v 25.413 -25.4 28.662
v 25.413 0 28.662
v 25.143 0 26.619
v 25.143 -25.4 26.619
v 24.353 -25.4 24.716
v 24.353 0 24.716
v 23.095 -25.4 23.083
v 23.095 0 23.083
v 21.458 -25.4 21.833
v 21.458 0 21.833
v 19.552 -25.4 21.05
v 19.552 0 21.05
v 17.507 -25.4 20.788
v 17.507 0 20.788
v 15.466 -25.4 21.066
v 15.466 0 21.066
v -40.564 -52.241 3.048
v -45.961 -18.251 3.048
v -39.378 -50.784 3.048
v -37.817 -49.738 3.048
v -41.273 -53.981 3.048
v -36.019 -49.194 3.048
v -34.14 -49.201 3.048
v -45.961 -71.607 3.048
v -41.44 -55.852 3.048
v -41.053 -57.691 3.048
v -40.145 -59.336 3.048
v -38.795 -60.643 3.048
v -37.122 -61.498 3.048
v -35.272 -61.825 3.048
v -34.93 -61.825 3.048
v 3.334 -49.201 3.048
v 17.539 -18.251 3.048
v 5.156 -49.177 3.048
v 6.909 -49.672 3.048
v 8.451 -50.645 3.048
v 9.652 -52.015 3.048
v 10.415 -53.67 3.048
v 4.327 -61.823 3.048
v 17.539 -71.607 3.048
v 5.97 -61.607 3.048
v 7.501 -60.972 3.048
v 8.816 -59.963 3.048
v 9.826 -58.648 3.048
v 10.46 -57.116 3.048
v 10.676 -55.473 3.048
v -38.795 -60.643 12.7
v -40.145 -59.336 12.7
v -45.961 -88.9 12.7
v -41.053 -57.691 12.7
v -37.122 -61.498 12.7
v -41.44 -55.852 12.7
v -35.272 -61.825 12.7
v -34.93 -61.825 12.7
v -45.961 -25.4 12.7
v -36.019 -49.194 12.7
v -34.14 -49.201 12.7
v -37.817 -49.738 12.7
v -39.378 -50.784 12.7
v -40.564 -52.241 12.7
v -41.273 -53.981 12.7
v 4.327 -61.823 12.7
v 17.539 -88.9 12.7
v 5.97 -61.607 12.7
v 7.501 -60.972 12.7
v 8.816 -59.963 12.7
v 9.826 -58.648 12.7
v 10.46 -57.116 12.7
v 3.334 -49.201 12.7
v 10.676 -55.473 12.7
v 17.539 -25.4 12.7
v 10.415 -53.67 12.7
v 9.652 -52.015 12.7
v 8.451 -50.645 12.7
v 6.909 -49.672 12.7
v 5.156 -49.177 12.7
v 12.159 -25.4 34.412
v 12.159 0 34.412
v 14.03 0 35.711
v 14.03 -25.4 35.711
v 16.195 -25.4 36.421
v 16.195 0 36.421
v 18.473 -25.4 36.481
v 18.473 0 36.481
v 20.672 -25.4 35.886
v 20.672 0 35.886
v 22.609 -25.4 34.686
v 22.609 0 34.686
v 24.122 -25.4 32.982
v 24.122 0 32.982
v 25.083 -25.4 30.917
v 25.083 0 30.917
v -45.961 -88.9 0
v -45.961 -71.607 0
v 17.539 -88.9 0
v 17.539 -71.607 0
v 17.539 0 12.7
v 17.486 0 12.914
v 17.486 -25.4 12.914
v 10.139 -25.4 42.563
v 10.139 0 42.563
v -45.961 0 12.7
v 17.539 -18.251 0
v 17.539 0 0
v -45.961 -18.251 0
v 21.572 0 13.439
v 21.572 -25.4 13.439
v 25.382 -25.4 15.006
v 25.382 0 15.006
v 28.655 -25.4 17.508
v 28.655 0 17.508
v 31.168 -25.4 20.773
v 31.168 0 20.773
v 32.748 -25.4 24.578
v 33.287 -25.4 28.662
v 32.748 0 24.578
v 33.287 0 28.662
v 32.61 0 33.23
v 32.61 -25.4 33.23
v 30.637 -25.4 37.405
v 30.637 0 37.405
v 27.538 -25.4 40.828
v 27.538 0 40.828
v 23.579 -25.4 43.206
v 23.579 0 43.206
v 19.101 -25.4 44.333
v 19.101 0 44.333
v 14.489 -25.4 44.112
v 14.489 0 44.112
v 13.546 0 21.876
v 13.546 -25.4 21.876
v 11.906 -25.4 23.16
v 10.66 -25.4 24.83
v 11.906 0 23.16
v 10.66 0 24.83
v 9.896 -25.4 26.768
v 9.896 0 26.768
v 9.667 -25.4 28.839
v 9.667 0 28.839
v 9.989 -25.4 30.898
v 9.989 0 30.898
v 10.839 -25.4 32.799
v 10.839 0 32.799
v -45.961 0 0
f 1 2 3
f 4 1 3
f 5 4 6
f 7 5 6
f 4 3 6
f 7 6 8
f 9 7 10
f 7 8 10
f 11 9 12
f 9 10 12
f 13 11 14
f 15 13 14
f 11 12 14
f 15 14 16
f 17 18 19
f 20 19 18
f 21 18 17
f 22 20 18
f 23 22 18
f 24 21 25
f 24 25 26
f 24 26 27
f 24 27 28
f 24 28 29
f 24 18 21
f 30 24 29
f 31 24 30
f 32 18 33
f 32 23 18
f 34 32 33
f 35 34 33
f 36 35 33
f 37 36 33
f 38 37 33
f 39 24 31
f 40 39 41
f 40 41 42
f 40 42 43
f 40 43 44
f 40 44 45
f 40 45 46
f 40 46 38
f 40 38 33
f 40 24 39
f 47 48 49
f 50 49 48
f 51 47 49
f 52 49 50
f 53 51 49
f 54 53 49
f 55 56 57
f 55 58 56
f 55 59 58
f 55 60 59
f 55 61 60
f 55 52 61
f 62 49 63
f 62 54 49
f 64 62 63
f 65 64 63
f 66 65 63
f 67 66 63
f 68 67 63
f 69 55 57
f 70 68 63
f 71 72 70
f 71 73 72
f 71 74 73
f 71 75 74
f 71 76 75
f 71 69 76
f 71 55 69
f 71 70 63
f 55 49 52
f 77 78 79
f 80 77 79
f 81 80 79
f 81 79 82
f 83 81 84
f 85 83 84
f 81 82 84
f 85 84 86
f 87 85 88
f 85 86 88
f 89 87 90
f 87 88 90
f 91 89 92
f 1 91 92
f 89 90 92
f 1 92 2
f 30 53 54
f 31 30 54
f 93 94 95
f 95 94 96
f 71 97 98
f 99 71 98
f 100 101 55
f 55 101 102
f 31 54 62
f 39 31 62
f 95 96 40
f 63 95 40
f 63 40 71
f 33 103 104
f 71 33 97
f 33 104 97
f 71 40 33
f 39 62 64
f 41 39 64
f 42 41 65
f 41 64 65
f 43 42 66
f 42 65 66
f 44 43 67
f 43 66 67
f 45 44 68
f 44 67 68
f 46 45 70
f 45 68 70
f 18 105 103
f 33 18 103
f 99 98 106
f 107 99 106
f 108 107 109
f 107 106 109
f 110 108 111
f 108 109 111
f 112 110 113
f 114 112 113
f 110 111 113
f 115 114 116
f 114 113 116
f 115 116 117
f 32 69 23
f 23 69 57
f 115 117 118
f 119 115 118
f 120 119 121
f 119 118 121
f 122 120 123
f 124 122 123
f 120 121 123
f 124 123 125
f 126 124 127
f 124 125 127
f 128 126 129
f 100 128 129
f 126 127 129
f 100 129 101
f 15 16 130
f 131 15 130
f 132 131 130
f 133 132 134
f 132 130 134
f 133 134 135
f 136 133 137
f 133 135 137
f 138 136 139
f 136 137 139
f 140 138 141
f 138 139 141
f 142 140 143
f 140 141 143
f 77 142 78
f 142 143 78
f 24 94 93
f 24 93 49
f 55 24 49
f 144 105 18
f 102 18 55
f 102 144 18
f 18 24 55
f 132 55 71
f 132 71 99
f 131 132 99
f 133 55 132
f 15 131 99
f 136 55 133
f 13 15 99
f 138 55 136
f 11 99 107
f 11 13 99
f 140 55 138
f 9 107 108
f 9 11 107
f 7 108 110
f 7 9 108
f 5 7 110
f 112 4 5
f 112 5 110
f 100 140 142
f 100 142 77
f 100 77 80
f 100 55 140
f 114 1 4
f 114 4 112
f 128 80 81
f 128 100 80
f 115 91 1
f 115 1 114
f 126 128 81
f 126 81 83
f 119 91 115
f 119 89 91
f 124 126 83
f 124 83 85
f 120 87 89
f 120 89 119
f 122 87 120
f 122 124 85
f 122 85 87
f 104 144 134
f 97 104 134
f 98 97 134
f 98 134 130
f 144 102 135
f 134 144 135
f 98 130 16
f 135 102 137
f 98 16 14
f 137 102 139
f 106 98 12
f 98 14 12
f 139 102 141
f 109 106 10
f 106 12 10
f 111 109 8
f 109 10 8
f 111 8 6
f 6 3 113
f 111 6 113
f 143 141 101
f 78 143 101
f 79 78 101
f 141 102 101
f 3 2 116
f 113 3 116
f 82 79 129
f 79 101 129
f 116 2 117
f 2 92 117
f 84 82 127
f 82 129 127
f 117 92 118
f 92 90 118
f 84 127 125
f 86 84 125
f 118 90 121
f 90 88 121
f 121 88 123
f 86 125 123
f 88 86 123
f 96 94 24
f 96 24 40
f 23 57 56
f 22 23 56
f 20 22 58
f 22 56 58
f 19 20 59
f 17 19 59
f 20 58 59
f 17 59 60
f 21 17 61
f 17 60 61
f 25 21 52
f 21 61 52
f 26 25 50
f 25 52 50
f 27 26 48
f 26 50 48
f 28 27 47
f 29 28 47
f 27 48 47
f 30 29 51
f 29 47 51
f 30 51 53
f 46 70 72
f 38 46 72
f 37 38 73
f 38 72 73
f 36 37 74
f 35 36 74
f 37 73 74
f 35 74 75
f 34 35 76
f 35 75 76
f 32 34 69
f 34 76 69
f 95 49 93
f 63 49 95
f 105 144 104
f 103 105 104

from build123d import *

# Parameters (mm, degrees)
F0_W     = 63.5
F0_H     = 12.7
F1_DEPTH = 25.4
F2_W     = 63.5
F2_H     = 12.7
F3_DEPTH = 63.5
F4_W     = 63.5
F4_H     = 53.356215
F5_DEPTH = 3.048
F7_DEPTH = 25.4


with BuildPart() as f1:
    # F0 (on Front) → F1 (new body)
    with BuildSketch(Plane.XZ):
        with Locations((-14.211346, 6.35)):
            Rectangle(F0_W, F0_H)
        with BuildLine():
            Line((10.138772, 42.563359), (-45.961346, 12.7))
            Line((-45.961346, 12.7), (17.538654, 12.7))
            Line((17.538654, 12.7), (17.485546, 12.914324))
            ThreePointArc((17.485546, 12.914324), (2.252939, 24.874567), (10.138772, 42.563359))
        make_face()
        with BuildLine():
            Line((12.158692, 34.41166), (10.138772, 42.563359))
            ThreePointArc((10.138772, 42.563359), (2.252939, 24.874567), (17.485546, 12.914324))
            Line((17.485546, 12.914324), (15.465626, 21.066023))
            ThreePointArc((15.465626, 21.066023), (9.895796, 26.768401), (12.158692, 34.41166))
        make_face()
        with BuildLine():
            ThreePointArc((33.286654, 28.662235), (25.646248, 42.162843), (10.138772, 42.563359))
            Line((10.138772, 42.563359), (12.158692, 34.41166))
            ThreePointArc((12.158692, 34.41166), (20.672187, 35.885866), (25.412654, 28.662235))
            ThreePointArc((25.412654, 28.662235), (22.31761, 22.404324), (15.465626, 21.066023))
            Line((15.465626, 21.066023), (17.485546, 12.914324))
            ThreePointArc((17.485546, 12.914324), (28.655379, 17.507956), (33.286654, 28.662235))
        make_face()
    extrude(amount=F1_DEPTH)

    # F2 (on face) → F3 (join)
    with BuildSketch(Plane.XZ.offset(25.4)):
        with Locations((-14.211346, 6.35)):
            Rectangle(F2_W, F2_H)
    extrude(amount=F3_DEPTH)

    # F4 (on face) → F5 (cut)
    with BuildSketch(Plane(origin=(0, 0, 0), x_dir=(1, 0, 0), z_dir=(0, 0, -1))):
        with Locations((-14.211346, 44.929125)):
            Rectangle(F4_W, F4_H)
    extrude(amount=-F5_DEPTH, mode=Mode.SUBTRACT)

    # F6 (on face) → F7 (cut)
    with BuildSketch(Plane.XY.offset(12.7)):
        with BuildLine():
            ThreePointArc((-34.139643, -49.201058), (-30.283279, -51.341679), (-28.751483, -55.47779))
            ThreePointArc((-28.751483, -55.47779), (-30.551195, -59.906941), (-34.930185, -61.825479))
            Line((-34.930185, -61.825479), (4.326623, -61.822998))
            ThreePointArc((4.326623, -61.822998), (-2.004218, -55.971033), (3.333617, -49.201058))
            Line((3.333617, -49.201058), (-34.139643, -49.201058))
        make_face()
        with BuildLine():
            ThreePointArc((-34.930185, -61.825479), (-30.551195, -59.906941), (-28.751483, -55.47779))
            ThreePointArc((-28.751483, -55.47779), (-30.283279, -51.341679), (-34.139643, -49.201058))
            ThreePointArc((-34.139643, -49.201058), (-41.426093, -54.910512), (-35.271977, -61.8255))
            Line((-35.271977, -61.8255), (-34.930185, -61.825479))
        make_face()
        with BuildLine():
            ThreePointArc((10.676221, -55.472998), (8.450507, -50.644668), (3.333617, -49.201058))
            ThreePointArc((3.333617, -49.201058), (-2.004218, -55.971033), (4.326623, -61.822998))
            ThreePointArc((4.326623, -61.822998), (8.816491, -59.962984), (10.676221, -55.472998))
        make_face()
    extrude(amount=-F7_DEPTH, mode=Mode.SUBTRACT)


solid = f1.part
